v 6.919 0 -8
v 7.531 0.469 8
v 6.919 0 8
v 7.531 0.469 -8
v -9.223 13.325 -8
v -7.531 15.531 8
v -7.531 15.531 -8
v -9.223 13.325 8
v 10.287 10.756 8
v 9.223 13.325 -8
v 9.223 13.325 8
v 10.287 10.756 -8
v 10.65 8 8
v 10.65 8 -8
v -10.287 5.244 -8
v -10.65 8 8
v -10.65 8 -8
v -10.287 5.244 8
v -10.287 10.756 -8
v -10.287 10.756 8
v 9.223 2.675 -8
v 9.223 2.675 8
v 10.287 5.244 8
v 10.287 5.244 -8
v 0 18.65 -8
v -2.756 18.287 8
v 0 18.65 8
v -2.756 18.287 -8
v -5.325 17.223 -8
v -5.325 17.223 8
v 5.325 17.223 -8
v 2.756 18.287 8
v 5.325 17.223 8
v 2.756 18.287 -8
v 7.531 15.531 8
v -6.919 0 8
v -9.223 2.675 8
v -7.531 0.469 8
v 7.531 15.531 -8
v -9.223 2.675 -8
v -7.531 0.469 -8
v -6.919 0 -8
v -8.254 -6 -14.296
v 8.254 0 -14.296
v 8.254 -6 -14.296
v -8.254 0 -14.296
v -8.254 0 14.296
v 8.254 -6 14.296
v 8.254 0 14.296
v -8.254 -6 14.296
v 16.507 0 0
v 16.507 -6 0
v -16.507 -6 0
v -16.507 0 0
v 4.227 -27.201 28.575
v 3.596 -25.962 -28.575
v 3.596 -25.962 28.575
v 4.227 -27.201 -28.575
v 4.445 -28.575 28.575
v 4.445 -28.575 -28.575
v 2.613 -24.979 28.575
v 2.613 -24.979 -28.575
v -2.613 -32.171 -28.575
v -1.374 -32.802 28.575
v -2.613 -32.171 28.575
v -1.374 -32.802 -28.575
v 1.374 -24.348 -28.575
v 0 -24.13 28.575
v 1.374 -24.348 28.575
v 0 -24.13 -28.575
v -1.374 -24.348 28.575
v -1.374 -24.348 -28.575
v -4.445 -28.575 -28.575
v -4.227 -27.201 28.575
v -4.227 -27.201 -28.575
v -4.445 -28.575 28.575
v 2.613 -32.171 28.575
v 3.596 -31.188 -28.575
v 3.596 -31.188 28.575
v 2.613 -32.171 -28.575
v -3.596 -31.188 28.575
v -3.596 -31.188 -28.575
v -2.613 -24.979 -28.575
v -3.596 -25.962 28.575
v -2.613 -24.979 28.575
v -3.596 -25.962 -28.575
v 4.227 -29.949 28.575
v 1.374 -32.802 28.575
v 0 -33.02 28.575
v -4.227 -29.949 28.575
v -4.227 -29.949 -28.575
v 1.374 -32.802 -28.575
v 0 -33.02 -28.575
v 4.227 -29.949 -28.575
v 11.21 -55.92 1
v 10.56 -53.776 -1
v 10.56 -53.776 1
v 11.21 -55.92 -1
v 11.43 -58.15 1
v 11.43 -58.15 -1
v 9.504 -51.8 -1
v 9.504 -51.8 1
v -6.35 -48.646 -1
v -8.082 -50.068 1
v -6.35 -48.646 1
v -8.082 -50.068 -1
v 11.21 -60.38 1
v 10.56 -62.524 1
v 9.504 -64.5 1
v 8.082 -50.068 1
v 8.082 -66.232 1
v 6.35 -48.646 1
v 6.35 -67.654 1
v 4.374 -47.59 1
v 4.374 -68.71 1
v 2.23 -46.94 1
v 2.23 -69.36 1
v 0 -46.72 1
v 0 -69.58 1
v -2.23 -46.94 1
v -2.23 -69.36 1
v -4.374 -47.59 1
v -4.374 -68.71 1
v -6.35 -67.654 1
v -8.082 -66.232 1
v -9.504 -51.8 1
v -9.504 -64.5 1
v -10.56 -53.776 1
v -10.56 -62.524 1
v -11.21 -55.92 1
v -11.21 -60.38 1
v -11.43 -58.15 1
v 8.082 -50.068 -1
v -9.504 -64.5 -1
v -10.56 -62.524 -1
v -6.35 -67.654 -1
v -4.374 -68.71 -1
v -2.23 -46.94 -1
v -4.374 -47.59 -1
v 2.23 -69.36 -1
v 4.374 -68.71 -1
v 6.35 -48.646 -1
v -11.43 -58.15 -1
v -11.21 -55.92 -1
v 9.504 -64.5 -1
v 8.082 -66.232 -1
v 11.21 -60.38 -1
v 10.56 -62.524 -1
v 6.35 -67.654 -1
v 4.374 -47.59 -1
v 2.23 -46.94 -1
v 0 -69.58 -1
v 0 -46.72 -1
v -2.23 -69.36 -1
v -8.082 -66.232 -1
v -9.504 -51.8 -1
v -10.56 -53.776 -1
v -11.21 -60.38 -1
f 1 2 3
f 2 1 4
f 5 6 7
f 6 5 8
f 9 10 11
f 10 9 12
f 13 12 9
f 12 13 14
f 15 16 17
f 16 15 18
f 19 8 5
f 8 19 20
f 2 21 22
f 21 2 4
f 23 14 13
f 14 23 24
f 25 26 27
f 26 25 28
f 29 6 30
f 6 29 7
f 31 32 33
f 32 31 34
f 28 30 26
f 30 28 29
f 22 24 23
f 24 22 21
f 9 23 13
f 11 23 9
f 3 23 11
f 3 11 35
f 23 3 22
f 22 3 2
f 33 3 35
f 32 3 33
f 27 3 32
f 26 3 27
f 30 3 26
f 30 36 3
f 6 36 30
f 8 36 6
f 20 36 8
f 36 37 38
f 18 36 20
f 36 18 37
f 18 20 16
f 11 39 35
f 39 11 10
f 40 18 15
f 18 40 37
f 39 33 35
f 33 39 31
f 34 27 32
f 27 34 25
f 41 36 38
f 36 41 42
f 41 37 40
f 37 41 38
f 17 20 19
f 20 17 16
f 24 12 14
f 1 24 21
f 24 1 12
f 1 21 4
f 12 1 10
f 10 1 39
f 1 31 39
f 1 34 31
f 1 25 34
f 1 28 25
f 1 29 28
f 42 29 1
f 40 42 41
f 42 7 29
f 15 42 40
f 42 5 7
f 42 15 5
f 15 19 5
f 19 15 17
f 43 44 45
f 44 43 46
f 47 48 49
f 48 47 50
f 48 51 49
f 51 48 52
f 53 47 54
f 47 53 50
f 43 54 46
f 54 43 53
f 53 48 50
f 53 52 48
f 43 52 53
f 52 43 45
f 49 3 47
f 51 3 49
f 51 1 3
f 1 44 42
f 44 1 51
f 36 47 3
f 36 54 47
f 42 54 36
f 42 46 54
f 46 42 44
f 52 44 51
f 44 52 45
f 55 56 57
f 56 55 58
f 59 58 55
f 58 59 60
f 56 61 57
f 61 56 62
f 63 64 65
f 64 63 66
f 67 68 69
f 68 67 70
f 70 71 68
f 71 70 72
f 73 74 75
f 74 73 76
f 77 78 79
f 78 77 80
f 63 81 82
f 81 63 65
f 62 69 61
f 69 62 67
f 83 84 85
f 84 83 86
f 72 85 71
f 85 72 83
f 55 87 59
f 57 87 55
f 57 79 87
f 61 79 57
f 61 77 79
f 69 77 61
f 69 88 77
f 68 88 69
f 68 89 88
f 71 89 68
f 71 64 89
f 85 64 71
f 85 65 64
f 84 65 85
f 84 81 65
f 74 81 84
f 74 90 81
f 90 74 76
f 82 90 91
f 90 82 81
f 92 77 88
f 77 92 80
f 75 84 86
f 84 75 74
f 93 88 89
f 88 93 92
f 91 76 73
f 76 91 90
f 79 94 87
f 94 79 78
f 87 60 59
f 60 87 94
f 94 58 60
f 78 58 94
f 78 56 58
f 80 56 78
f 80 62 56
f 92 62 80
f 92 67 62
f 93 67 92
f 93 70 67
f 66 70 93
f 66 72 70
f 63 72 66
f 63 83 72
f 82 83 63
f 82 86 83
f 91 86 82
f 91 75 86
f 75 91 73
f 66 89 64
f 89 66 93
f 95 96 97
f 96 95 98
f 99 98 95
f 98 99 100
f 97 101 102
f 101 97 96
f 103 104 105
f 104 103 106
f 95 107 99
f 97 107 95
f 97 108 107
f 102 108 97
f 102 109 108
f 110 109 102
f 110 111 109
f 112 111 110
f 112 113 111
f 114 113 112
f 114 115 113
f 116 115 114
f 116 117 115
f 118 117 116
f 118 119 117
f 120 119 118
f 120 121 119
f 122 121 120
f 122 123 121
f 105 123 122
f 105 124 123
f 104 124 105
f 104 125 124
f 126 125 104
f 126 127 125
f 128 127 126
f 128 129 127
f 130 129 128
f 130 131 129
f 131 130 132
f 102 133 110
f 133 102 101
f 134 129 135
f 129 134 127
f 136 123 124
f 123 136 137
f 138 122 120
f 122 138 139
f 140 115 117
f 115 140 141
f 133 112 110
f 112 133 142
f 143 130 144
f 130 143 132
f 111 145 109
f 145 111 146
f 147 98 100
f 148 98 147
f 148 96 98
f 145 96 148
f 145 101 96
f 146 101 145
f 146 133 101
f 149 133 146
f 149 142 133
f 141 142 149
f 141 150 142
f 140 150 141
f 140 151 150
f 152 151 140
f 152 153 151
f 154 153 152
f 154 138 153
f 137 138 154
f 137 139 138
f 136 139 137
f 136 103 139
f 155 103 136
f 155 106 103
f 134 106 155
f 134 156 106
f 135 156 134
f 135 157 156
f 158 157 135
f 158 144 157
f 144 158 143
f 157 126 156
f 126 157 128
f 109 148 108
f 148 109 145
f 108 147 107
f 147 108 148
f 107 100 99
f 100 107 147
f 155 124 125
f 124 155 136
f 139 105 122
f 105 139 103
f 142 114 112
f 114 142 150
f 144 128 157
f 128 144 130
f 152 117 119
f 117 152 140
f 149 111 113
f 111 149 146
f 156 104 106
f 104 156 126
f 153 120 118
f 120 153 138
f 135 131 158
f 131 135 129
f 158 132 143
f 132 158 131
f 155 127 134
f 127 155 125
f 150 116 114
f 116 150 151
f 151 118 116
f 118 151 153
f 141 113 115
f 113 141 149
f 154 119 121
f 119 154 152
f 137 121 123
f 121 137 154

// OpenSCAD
// Auto-generated by scripts/author_from_manifest.py (Phase D.3).
// Source: data/phase_d_manifest.json (sku_intent='tyco-rfii-pendent-k49-155f').
// Do not hand-edit — regenerate from the manifest.
//
// @part tyco_rfii_pendent_k49_155f
// @kind sprinkler_head
// @category head.pendant.k49
// @display-name "Tyco RFII Residential Pendent K4.9 155°F"
// @mfg tyco_fire_protection
// @mfg-pn RFII
// @listing UL FM
// @hazard-classes LH
// @price-usd 18.50
// @install-minutes 8
// @crew journeyman
// @k-factor 4.9
// @orientation pendant
// @response quick
// @temperature 155F
// @param size_in number default=0.5 label="Size" unit="in"
// @port inlet position=[0,0.014,0] direction=[0,1,0] style=NPT_threaded size_in=0.5 role=drop

size_in = 0.5;
k_factor = 4.9;

length_mm   = 57.15;
body_dia_mm = 25.40;
thread_od   = 21.3;
thread_len  = 16;
deflector_d = body_dia_mm * 0.9;

 union() {
    translate([0, thread_len/2, 0])
        cylinder(h = thread_len, d = thread_od, center = true, $fn = 24);
    translate([0, -3, 0])
        rotate([90, 0, 0])
        cylinder(h = 6, d = thread_od * 1.55, $fn = 6, center = true);
    translate([0, -length_mm/2, 0])
        cylinder(h = length_mm, d = body_dia_mm * 0.35, center = true, $fn = 20);
    translate([0, -length_mm - 1, 0])
        cylinder(h = 2, d = deflector_d, center = true, $fn = 32);
}
